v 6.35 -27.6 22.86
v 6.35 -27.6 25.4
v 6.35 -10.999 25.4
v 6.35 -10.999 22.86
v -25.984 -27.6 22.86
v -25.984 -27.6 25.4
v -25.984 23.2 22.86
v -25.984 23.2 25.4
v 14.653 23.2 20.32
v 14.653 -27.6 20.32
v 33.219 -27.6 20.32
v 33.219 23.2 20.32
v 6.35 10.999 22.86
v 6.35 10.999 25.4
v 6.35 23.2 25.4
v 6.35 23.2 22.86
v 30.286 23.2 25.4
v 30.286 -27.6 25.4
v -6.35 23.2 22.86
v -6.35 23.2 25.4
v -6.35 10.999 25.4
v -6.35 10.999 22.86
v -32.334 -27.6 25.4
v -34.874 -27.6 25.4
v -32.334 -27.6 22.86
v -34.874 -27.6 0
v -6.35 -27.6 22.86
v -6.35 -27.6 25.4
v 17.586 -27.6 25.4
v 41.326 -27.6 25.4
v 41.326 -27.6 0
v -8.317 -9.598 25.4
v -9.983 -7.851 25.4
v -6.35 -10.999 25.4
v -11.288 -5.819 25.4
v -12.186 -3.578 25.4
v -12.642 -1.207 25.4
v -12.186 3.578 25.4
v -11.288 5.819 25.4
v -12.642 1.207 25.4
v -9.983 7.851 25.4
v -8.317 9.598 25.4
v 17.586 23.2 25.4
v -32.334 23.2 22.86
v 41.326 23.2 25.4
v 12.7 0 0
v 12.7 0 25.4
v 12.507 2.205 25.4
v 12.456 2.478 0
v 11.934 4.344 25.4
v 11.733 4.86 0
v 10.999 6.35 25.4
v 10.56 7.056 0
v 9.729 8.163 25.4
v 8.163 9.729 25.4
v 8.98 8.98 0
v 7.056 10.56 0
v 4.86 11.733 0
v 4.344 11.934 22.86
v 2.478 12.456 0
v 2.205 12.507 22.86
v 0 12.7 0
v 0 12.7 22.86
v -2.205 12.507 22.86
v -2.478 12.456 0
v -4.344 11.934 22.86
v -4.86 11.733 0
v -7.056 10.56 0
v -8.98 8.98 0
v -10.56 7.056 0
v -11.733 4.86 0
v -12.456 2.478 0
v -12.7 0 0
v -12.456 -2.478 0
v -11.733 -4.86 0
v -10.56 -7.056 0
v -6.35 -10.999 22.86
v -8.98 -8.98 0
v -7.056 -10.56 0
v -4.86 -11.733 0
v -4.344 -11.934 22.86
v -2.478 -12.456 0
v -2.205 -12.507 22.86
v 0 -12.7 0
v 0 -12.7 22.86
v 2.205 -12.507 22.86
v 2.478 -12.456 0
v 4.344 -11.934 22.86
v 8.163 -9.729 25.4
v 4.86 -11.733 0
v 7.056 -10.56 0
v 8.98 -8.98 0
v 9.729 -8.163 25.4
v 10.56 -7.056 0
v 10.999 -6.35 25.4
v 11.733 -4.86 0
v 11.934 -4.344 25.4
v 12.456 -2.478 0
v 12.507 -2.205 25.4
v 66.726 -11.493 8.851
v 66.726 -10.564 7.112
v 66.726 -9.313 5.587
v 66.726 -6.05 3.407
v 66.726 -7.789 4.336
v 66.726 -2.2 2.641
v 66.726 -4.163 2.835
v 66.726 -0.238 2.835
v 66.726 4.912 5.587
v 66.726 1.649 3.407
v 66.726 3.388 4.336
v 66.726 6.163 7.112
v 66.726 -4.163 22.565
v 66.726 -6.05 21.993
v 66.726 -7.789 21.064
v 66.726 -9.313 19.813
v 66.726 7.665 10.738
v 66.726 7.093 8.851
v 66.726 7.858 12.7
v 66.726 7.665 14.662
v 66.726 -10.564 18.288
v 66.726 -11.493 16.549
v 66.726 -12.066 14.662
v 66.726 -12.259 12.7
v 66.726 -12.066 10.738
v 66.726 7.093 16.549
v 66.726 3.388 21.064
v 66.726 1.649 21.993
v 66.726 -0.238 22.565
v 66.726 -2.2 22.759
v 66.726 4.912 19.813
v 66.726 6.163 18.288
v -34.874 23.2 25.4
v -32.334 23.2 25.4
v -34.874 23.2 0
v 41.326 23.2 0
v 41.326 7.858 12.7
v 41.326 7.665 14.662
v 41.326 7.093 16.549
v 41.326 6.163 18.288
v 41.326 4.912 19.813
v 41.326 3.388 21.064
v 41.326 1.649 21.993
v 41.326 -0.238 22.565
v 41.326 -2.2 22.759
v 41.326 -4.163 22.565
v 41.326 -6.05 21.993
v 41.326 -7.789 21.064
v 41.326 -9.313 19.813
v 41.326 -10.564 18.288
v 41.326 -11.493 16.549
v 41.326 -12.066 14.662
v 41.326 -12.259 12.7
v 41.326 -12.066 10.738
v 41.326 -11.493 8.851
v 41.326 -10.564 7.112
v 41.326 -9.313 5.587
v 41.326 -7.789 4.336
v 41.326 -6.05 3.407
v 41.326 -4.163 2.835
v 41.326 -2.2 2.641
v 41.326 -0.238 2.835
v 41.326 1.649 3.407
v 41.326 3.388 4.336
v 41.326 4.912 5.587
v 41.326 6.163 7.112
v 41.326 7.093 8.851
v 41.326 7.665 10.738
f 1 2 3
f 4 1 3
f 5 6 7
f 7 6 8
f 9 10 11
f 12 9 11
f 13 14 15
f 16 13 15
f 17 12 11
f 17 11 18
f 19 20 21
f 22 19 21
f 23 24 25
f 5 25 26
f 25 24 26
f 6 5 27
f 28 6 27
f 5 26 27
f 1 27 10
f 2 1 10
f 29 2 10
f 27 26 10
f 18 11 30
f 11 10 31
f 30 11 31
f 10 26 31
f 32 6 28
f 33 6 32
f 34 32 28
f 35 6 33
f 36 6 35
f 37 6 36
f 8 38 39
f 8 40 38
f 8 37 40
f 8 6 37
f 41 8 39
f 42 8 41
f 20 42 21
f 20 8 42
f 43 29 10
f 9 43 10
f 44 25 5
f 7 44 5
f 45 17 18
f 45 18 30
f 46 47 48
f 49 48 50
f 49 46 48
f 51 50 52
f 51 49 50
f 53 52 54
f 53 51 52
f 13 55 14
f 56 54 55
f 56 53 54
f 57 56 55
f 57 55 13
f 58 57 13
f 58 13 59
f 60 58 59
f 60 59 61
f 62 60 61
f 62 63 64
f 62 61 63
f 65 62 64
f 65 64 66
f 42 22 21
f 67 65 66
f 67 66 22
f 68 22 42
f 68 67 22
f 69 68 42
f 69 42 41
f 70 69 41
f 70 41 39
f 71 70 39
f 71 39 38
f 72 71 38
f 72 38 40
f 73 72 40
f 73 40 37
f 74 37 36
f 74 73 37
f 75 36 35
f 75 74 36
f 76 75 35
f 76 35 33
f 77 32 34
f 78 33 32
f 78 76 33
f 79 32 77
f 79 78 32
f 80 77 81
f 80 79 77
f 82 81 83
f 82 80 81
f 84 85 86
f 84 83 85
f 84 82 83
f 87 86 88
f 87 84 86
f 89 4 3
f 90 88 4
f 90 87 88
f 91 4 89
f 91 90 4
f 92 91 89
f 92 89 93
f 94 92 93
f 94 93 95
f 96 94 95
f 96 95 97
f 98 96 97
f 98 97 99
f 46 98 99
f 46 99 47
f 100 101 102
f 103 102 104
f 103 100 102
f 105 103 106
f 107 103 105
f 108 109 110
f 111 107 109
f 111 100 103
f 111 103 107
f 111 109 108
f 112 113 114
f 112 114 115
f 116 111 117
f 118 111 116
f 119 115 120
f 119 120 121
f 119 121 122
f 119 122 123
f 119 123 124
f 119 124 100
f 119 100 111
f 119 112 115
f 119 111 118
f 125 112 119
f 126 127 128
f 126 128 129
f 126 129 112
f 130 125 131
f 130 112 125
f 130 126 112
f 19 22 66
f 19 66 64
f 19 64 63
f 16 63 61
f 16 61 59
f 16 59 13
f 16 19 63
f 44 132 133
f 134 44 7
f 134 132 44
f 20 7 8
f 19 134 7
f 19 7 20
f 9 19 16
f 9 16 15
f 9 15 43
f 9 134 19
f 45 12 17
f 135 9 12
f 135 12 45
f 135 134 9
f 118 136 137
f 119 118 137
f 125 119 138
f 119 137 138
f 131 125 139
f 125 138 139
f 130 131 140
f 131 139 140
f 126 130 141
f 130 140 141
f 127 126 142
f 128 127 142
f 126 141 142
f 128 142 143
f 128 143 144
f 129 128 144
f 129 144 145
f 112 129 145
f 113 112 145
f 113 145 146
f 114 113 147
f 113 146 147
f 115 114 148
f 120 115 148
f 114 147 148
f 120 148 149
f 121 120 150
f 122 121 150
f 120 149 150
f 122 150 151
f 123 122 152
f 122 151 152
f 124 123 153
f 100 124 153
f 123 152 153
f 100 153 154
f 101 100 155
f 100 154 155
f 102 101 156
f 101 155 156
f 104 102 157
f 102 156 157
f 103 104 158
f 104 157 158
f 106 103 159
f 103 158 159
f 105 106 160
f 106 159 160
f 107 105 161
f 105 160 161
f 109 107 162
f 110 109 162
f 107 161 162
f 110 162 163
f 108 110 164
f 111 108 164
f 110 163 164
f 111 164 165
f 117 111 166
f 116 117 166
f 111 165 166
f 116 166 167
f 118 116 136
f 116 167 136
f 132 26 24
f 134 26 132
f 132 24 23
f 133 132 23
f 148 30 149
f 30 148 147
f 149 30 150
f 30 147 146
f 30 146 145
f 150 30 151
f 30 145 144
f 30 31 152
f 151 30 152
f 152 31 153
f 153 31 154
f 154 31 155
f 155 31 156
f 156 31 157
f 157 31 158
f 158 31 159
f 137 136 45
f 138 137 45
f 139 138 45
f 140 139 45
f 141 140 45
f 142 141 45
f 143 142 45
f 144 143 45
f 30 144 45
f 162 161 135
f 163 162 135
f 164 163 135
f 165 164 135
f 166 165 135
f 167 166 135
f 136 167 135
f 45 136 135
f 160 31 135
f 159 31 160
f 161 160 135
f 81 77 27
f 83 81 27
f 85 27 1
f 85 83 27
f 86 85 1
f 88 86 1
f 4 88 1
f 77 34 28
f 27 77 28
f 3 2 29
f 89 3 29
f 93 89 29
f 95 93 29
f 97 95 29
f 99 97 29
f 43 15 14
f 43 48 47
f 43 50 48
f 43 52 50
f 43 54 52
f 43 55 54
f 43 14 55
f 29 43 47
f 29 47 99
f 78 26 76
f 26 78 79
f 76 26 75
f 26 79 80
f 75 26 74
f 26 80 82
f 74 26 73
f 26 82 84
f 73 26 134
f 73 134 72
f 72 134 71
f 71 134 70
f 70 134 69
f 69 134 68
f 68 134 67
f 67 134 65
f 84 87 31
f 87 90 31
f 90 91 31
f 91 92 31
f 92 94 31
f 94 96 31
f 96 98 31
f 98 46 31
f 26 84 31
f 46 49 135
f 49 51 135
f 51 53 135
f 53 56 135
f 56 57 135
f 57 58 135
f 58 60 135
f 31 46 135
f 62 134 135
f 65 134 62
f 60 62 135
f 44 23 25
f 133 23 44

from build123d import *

# Parameters (mm, degrees)
F0_W     = 76.2
F0_H     = 50.8
F0_R     = 12.7
F1_DEPTH = 25.4
F2_W     = 6.35
F2_H     = 50.8
F3_DEPTH = 2.54
F5_R     = 10.0587183536
F6_DEPTH = 25.4
F7_DEPTH = 12.446
F8_DEPTH = 70.358


with BuildPart() as f1:
    # F0 (on Top) → F1 (new body)
    with BuildSketch(Plane.XY):
        with Locations((3.2262094319, -2.200336157)):
            Rectangle(F0_W, F0_H)
        Circle(F0_R, mode=Mode.SUBTRACT)
    extrude(amount=F1_DEPTH)

    # F2 (on face) → F3 (cut)
    with BuildSketch(Plane.XY.offset(25.4)):
        with Locations((-29.1587905681, -2.200336157)):
            Rectangle(F2_W, F2_H)
        with BuildLine():
            Line((-6.35, -10.9985226281), (-6.35, -27.600336157))
            Line((-6.35, -27.600336157), (6.35, -27.600336157))
            Line((6.35, -27.600336157), (6.35, -10.9985226281))
            ThreePointArc((6.35, -10.9985226281), (0, -12.7), (-6.35, -10.9985226281))
        make_face()
        with BuildLine():
            Line((6.35, 23.199663843), (-6.35, 23.199663843))
            Line((-6.35, 23.199663843), (-6.35, 10.9985226281))
            ThreePointArc((-6.35, 10.9985226281), (0, 12.7), (6.35, 10.9985226281))
            Line((6.35, 10.9985226281), (6.35, 23.199663843))
        make_face()
    extrude(amount=-F3_DEPTH, mode=Mode.SUBTRACT)

    # F5 (on face) → F6 (join)
    with BuildSketch(Plane.YZ.offset(41.3262094319)):
        with Locations((-2.200336157, 12.7)):
            Circle(F5_R)
    extrude(amount=F6_DEPTH)

    # F5 (on face) → F7 (join)
    with BuildSketch(Plane.YZ.offset(41.3262094319)):
        with Locations((-2.200336157, 12.7)):
            Circle(F5_R)
    extrude(amount=-F7_DEPTH)

    # F4 (on face) → F8 (cut)
    with BuildSketch(Plane.XZ.offset(27.600336157)):
        Polygon((30.2859525938, 25.4), (17.5859525938, 25.4), (14.6530132263, 20.32), (33.2188919613, 20.32), align=None)
    extrude(amount=-F8_DEPTH, mode=Mode.SUBTRACT)


solid = f1.part
